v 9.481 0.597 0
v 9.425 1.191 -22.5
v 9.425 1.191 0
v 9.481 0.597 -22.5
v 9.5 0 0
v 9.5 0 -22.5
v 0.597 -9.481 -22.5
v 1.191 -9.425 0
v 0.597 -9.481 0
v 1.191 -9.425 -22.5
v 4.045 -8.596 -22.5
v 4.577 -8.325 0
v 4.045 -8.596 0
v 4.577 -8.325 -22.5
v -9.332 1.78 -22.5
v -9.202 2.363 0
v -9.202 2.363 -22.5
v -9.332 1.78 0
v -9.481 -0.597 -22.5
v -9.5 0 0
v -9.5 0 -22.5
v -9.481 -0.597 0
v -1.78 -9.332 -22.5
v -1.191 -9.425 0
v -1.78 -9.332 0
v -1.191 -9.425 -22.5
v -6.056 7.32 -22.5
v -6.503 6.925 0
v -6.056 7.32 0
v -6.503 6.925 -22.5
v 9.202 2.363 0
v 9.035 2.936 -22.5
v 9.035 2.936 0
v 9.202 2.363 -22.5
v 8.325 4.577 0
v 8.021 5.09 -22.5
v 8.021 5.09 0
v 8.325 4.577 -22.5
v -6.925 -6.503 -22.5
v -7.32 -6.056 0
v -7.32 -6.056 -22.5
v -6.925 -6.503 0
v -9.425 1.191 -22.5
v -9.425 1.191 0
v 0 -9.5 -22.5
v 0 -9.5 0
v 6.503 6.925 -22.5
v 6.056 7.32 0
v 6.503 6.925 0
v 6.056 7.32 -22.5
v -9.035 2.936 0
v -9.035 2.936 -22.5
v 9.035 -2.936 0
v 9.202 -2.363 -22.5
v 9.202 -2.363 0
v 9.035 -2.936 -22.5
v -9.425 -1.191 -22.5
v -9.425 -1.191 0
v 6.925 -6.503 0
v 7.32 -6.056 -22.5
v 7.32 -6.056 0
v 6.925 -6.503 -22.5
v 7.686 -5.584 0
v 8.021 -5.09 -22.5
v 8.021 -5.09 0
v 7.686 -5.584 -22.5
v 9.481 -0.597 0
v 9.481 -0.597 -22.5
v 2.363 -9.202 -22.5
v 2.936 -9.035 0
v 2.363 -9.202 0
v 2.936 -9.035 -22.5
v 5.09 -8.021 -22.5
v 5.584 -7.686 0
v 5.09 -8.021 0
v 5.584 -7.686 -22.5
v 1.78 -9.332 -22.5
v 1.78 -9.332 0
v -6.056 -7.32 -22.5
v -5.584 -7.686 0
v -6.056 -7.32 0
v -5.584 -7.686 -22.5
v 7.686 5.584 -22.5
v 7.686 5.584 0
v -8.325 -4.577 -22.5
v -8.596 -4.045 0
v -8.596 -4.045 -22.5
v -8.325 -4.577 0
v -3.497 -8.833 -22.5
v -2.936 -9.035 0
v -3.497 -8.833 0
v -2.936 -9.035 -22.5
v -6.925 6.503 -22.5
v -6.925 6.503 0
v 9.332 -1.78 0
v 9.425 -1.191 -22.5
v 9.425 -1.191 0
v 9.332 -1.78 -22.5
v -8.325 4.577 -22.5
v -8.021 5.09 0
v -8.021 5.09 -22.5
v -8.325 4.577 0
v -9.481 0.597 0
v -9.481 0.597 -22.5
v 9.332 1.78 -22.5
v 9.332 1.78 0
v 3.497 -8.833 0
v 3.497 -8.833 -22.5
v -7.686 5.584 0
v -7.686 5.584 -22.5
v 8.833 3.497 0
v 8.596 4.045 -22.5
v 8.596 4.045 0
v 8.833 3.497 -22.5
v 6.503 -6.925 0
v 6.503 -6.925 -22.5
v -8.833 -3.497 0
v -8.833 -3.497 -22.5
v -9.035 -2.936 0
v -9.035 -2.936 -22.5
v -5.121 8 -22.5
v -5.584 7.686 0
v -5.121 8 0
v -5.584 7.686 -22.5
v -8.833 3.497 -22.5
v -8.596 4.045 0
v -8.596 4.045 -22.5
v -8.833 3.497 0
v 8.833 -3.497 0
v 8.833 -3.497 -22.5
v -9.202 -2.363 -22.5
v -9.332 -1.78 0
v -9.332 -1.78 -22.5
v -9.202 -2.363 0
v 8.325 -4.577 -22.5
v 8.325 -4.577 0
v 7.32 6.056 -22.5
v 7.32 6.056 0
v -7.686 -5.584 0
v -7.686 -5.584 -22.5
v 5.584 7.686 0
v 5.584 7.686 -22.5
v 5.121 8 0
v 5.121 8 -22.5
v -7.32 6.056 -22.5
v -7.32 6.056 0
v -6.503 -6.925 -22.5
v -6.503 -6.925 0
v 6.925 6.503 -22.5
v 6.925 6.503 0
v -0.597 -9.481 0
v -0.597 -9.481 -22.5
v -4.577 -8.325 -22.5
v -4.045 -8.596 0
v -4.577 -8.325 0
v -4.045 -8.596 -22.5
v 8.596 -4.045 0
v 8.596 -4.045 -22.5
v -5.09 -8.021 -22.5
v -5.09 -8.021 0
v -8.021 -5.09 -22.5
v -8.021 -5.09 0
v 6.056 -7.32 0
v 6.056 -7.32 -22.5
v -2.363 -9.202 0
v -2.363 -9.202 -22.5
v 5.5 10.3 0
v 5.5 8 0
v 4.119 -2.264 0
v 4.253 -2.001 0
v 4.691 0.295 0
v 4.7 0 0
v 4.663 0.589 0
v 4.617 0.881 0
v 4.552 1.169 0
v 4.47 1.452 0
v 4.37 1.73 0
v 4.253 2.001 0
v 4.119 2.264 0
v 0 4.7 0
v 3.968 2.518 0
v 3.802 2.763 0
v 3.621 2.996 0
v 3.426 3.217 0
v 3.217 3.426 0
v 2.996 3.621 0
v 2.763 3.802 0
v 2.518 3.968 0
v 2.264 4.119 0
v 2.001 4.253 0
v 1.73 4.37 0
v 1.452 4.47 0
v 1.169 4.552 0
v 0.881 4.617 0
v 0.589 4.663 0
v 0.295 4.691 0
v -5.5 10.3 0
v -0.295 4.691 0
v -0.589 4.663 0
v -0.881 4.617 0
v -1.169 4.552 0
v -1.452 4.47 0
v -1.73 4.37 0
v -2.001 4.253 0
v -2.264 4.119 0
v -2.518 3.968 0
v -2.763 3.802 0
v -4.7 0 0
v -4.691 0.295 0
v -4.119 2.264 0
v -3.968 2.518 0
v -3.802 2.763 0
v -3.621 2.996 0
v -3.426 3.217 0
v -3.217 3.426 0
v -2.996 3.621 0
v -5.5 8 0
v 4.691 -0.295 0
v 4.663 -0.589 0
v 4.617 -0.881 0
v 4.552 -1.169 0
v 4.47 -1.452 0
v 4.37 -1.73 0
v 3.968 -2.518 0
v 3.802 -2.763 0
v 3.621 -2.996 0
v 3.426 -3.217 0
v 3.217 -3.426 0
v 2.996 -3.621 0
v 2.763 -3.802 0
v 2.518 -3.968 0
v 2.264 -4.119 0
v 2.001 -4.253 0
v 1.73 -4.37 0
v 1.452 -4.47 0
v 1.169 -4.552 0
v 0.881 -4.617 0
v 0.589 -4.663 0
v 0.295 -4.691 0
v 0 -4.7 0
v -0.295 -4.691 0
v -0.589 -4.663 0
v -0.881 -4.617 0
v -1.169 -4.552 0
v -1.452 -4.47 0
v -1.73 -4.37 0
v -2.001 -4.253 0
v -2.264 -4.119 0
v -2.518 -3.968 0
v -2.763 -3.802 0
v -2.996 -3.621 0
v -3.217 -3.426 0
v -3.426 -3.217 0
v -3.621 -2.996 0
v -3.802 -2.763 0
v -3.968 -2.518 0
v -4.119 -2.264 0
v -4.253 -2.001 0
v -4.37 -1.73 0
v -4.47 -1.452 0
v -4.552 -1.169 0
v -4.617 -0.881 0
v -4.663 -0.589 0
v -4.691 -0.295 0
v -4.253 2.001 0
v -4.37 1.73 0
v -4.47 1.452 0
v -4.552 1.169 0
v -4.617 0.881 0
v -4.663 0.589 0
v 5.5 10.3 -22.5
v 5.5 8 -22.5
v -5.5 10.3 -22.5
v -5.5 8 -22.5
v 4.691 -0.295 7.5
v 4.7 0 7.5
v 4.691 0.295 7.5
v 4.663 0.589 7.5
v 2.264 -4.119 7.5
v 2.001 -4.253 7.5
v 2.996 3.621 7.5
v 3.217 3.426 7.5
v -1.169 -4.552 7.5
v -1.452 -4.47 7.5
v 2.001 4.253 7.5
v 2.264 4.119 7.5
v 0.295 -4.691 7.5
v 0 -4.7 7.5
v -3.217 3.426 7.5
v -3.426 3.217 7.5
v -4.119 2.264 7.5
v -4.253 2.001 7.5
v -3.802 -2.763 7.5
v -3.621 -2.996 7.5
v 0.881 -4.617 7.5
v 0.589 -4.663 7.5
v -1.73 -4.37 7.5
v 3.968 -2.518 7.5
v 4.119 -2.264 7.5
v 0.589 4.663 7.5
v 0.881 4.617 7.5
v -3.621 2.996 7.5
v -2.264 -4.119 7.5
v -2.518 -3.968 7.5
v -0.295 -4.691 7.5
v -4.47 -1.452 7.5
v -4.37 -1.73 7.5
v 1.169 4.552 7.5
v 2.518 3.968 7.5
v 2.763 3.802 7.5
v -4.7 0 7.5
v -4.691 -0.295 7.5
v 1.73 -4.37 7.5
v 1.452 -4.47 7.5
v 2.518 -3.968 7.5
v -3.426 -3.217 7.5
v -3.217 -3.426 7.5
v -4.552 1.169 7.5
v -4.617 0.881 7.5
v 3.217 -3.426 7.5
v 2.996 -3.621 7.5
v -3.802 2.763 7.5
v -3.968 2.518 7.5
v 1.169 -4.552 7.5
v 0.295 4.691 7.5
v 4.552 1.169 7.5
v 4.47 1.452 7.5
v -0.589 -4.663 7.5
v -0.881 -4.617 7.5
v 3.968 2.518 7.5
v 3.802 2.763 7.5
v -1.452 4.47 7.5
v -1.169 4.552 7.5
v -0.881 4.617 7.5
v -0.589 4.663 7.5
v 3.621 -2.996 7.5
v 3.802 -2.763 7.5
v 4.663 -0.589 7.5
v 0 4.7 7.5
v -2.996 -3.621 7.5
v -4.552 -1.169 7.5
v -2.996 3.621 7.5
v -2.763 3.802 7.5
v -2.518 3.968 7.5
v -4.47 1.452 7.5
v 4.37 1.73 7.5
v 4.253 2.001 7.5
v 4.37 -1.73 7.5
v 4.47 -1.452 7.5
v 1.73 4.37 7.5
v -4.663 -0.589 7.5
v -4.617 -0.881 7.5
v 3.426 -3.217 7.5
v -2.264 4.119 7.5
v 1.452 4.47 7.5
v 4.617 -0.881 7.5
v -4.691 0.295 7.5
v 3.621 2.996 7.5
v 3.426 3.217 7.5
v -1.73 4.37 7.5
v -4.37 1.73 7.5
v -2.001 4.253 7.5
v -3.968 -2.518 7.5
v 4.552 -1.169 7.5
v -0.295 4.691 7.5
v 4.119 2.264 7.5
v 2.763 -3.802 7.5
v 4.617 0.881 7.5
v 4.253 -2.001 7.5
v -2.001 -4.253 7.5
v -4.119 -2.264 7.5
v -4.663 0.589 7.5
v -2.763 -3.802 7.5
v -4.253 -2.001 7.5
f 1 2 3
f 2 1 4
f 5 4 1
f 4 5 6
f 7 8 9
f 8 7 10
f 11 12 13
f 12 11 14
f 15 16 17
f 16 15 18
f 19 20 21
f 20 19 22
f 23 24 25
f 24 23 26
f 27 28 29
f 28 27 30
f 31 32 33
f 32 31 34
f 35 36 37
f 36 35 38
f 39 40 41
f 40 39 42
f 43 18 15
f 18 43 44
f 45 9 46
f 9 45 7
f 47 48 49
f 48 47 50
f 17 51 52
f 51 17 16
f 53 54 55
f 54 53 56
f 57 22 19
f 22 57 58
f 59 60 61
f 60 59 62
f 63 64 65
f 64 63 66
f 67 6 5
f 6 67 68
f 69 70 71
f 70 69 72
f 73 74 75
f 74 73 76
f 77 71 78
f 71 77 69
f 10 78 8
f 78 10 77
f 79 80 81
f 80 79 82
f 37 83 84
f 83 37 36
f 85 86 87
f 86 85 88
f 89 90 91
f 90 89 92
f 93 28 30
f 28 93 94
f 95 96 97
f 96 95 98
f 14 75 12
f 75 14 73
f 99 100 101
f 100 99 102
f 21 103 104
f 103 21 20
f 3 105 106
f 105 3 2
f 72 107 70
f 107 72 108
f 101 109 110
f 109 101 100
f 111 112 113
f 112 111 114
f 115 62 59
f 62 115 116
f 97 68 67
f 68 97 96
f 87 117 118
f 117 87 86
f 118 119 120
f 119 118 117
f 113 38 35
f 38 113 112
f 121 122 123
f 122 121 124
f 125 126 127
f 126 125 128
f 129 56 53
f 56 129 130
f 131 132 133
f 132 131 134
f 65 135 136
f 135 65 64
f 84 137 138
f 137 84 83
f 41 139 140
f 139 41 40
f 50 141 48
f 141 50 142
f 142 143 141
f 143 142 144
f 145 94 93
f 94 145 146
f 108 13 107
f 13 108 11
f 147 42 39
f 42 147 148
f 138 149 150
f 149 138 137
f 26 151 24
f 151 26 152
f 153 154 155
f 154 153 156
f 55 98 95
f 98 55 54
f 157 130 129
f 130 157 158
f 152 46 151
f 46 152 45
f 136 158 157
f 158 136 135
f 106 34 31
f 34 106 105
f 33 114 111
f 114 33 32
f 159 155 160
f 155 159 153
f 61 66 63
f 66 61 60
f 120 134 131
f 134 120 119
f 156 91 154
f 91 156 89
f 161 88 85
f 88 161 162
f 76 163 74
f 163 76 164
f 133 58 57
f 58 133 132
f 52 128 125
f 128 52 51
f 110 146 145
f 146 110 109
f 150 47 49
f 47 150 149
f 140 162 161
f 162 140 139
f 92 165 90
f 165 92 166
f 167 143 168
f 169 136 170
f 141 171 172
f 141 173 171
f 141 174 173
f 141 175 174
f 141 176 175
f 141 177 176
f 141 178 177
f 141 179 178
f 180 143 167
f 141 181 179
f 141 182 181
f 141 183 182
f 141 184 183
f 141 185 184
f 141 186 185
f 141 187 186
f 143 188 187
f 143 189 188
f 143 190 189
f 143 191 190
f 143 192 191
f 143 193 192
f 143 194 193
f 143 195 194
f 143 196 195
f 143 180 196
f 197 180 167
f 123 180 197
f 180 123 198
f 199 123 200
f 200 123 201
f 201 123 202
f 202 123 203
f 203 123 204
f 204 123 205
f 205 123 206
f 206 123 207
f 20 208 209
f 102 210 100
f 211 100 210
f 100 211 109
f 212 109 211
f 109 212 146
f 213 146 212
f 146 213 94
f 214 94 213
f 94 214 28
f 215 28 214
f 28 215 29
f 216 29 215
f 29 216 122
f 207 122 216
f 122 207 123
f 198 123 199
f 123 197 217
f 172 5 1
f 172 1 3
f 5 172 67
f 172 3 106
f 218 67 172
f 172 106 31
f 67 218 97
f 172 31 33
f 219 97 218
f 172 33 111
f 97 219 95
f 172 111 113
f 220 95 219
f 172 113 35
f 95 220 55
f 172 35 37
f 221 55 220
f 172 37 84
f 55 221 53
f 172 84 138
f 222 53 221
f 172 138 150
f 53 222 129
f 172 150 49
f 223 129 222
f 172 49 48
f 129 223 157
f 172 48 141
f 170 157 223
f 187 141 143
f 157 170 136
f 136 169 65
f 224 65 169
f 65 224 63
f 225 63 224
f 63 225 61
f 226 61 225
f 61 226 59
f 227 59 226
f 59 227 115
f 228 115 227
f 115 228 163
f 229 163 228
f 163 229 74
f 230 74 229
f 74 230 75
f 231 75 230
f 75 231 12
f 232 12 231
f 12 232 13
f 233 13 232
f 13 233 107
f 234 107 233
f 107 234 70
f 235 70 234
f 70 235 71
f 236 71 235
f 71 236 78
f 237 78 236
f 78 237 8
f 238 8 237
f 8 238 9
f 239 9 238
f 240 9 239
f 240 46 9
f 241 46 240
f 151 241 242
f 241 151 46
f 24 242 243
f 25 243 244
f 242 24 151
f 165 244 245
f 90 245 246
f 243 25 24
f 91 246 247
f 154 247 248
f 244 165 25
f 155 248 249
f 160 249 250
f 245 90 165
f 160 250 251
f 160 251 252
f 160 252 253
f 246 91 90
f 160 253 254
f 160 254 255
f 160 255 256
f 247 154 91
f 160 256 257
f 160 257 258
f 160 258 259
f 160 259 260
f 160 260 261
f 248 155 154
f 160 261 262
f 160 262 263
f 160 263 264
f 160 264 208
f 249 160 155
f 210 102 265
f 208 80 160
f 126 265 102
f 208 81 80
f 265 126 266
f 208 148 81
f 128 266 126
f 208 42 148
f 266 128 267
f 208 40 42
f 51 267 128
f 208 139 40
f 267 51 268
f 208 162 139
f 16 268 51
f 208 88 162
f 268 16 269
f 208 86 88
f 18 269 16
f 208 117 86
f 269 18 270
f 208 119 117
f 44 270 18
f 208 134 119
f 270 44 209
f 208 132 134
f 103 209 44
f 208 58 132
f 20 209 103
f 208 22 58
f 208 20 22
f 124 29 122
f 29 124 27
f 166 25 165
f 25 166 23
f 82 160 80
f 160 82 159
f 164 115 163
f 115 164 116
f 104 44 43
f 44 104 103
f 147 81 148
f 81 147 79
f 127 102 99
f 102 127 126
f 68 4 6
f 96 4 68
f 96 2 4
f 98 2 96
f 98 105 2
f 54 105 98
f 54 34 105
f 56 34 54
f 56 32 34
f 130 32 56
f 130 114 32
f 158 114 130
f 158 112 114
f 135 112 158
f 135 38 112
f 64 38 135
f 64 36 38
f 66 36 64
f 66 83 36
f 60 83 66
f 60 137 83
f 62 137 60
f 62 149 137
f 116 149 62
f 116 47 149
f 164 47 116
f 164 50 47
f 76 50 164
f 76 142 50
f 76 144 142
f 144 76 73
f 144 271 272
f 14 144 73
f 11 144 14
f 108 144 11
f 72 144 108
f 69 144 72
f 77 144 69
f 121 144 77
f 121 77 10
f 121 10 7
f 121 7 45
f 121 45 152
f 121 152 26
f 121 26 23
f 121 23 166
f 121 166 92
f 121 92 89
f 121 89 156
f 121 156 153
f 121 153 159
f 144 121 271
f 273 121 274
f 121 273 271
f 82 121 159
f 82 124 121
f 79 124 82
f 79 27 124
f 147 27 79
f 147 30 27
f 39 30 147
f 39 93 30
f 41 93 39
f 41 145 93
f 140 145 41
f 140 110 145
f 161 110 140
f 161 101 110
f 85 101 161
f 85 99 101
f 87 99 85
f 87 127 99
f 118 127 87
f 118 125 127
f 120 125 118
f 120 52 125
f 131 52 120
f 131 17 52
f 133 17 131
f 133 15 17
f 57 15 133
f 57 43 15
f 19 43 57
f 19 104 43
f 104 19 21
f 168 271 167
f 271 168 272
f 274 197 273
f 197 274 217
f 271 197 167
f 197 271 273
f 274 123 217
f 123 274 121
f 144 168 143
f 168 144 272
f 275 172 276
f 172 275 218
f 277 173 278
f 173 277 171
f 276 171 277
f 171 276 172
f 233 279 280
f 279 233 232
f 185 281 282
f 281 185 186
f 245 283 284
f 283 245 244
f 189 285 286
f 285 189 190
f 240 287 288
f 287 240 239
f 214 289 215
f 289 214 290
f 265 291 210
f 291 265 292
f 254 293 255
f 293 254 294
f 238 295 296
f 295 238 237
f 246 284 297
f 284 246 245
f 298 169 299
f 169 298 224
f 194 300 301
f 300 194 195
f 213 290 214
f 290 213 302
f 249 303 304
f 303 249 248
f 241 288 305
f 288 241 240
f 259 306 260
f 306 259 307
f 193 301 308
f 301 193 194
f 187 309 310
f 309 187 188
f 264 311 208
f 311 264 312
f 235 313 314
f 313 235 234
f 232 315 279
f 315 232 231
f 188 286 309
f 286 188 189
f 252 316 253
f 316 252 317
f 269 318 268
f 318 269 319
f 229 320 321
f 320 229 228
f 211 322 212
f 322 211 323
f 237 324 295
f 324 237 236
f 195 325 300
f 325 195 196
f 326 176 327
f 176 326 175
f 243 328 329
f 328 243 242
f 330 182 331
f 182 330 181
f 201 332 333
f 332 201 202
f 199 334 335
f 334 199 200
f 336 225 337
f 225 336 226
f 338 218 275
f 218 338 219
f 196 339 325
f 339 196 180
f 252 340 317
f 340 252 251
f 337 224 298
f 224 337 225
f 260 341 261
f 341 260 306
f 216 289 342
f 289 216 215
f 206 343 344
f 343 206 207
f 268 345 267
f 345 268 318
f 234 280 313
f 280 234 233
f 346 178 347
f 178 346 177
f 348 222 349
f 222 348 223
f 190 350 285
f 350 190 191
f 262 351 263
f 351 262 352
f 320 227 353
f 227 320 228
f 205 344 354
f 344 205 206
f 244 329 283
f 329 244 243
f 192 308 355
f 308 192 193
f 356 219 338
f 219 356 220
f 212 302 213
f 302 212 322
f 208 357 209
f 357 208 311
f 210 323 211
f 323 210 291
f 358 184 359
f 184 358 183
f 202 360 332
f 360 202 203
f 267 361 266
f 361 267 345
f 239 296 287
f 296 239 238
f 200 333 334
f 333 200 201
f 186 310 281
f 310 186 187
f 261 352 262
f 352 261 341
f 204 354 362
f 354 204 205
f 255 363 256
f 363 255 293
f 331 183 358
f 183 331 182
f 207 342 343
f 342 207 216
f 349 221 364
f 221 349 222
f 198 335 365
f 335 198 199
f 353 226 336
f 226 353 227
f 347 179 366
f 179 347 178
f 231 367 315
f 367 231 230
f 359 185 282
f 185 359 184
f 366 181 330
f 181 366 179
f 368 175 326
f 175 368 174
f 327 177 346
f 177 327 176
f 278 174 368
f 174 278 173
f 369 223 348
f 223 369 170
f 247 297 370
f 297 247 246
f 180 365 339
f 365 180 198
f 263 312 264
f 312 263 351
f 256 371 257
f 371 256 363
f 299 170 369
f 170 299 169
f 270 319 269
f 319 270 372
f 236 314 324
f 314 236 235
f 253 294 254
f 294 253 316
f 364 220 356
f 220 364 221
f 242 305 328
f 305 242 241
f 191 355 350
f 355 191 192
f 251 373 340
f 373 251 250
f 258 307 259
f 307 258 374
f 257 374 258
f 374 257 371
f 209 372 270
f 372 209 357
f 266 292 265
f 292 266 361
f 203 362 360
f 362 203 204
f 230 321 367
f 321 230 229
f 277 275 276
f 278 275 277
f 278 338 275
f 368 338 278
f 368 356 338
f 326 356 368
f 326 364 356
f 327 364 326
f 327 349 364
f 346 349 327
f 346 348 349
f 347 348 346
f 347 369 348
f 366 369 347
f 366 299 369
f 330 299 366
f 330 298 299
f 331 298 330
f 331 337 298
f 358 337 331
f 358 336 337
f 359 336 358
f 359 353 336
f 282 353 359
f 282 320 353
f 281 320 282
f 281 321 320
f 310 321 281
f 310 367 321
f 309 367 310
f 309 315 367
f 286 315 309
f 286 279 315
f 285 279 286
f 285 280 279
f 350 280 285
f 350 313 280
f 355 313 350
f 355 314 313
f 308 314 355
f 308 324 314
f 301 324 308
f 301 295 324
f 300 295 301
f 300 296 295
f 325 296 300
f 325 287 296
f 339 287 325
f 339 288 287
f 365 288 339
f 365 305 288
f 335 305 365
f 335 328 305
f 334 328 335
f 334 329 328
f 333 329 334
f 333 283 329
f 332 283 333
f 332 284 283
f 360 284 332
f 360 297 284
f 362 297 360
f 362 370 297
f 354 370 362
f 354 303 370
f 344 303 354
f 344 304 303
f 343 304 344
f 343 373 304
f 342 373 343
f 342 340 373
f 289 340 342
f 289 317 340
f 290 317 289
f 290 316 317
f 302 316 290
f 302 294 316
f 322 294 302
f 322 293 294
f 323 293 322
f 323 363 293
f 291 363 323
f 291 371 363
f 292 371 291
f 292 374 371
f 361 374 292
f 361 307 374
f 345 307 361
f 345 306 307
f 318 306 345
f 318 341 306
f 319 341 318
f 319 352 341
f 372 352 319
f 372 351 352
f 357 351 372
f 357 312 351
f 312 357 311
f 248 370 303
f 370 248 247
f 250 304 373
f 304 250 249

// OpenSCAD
$fn = $preview ? 20 : 100; 
tolerance = 0.3;

module jack_14in() {
    cylinder(r = 4.4 + tolerance, h = 7.5);
    
    translate([0, 0, -22.5]) 
    union() {
        cylinder(r = 9.5, h = 22.5);
        
        translate([-5.5, 8, 0])
        cube([11, 2.3, 22.5]);
    } 
}

jack_14in();
